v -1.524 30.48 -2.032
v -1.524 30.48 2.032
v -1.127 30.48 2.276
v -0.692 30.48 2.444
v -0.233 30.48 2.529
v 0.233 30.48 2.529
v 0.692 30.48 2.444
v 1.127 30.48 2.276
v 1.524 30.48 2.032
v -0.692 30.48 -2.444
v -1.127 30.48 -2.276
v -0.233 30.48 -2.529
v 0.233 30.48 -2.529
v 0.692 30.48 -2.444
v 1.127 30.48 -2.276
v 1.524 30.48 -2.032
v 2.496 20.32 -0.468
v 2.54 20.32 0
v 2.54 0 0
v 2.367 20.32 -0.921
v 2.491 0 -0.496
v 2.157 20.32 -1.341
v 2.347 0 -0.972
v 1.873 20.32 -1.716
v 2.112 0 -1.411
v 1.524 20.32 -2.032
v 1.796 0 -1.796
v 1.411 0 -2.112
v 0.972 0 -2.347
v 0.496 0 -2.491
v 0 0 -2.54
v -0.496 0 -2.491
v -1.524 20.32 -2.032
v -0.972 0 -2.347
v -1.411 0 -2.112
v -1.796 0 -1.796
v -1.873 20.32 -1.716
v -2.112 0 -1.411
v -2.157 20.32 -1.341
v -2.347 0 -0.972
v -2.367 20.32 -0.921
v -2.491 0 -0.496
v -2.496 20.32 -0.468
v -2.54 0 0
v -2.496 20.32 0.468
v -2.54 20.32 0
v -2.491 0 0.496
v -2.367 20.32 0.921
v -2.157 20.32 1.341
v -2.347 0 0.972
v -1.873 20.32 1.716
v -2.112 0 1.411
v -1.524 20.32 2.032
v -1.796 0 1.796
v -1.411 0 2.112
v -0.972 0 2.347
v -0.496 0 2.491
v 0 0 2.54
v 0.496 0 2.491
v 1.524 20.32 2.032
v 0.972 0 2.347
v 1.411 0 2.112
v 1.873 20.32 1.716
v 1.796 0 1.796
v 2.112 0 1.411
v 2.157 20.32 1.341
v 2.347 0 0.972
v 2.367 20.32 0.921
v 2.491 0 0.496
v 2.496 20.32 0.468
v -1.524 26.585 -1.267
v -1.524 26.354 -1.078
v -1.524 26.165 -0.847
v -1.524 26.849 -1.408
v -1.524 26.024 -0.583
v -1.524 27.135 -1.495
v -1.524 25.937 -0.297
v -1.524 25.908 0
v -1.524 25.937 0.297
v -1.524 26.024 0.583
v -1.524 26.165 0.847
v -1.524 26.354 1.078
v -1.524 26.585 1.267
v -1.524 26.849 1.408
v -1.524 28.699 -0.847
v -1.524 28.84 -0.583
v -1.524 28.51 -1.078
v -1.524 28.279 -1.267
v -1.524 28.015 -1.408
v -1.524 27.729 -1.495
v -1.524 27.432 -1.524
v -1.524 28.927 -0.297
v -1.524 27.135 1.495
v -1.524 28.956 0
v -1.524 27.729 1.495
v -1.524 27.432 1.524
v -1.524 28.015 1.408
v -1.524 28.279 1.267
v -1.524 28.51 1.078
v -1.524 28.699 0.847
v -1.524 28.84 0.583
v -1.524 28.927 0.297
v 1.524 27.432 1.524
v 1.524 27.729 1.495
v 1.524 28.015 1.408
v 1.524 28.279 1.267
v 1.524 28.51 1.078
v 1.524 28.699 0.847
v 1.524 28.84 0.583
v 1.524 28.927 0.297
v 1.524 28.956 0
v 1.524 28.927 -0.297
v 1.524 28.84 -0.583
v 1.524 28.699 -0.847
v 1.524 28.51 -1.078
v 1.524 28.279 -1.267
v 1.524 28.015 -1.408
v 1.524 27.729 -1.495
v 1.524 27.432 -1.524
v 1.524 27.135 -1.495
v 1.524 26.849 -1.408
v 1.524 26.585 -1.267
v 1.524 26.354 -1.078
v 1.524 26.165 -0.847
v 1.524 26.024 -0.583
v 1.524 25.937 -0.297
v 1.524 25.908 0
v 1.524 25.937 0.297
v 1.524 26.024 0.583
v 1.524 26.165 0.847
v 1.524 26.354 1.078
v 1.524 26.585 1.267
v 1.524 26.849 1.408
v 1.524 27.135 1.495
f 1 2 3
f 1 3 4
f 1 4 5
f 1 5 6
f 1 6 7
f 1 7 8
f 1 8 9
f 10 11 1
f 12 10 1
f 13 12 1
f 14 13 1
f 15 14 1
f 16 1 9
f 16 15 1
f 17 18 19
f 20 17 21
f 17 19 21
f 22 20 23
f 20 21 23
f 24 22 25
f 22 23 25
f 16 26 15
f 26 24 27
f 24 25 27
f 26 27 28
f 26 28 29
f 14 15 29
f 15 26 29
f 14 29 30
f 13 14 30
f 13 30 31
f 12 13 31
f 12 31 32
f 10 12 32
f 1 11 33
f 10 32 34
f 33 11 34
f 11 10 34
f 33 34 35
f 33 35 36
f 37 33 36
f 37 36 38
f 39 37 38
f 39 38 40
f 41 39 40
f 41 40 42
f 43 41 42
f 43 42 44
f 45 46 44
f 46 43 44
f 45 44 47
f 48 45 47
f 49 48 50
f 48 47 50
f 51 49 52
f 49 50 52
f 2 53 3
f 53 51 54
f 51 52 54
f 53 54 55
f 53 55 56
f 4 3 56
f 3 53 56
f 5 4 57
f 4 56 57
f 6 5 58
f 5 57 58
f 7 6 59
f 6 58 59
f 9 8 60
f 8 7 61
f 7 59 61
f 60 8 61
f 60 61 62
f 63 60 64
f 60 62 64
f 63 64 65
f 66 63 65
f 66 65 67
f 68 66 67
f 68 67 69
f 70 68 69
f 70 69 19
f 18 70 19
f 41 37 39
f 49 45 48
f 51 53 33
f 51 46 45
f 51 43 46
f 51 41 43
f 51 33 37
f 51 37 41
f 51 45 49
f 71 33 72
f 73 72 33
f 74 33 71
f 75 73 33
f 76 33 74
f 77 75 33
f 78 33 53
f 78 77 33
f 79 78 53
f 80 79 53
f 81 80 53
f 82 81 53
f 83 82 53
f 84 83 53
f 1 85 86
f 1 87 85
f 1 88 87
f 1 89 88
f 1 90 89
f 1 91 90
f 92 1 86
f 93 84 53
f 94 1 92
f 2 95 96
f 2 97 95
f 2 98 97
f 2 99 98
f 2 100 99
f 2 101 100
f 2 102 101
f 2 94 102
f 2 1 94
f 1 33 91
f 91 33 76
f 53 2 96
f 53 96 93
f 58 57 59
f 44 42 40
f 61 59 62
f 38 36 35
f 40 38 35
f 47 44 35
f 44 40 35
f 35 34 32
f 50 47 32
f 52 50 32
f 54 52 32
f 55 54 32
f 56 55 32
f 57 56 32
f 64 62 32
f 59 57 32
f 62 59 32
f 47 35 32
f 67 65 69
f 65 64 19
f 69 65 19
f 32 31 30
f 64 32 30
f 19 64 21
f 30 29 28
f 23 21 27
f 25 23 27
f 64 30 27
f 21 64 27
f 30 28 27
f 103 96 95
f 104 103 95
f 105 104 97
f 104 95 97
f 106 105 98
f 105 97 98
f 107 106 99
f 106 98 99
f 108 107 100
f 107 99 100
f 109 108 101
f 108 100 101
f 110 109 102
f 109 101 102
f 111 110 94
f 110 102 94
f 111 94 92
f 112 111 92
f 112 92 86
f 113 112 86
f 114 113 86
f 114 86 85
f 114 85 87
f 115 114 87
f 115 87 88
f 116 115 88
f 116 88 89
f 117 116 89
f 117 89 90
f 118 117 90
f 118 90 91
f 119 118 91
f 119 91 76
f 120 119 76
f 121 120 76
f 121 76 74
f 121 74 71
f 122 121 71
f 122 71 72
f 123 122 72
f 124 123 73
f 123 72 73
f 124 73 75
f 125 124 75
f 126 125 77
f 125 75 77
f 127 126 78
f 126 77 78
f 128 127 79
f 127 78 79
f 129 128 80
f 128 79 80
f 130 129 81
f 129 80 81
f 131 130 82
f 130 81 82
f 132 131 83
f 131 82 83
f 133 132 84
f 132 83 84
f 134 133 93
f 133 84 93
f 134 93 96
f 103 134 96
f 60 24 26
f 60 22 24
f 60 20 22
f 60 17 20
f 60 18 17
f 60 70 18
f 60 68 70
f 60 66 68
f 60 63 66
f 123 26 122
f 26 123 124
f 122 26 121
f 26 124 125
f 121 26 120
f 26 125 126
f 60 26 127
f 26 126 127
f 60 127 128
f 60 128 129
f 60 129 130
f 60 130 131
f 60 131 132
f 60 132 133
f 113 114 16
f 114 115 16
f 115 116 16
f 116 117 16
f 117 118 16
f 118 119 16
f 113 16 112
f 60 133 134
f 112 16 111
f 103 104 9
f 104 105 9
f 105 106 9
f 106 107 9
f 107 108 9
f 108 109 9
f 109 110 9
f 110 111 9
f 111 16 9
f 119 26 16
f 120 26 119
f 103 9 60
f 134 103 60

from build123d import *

# Parameters (mm, degrees)
SKETCH1_R          = 2.54
EXTRUDE1_DEPTH     = 30.48
SKETCH2_W          = 2.032
SKETCH2_H          = 9.951877561
SKETCH2_W_2        = 1.949333431
SKETCH2_H_2        = 9.106721584
CUT_EXTRUDE1_DEPTH = 10.16
SKETCH4_R          = 1.524
CUT_EXTRUDE2_DEPTH = 10


with BuildPart() as part:
    # Sketch1 → Extrude1 (new body)
    with BuildSketch(Plane(origin=(0, 0, 0), x_dir=(1, 0, 0), z_dir=(0, 1, 0))):
        Circle(SKETCH1_R)
    extrude(amount=EXTRUDE1_DEPTH)

    # Sketch2 → Cut-Extrude1 (cut)
    with BuildSketch(Plane(origin=(0, 30.48, 0), x_dir=(-1, 0, 0), z_dir=(0, 1, 0))):
        with Locations((-2.54, 0.177802653)):
            Rectangle(SKETCH2_W, SKETCH2_H)
        with Locations((2.498666716, 0.600380641)):
            Rectangle(SKETCH2_W_2, SKETCH2_H_2)
    extrude(amount=-CUT_EXTRUDE1_DEPTH, mode=Mode.SUBTRACT)

    # Sketch4 → Cut-Extrude2 (cut)
    with BuildSketch(Plane.ZY.offset(1.524)):
        with Locations((0, 27.432)):
            Circle(SKETCH4_R)
    extrude(amount=-CUT_EXTRUDE2_DEPTH, mode=Mode.SUBTRACT)


solid = part.part
